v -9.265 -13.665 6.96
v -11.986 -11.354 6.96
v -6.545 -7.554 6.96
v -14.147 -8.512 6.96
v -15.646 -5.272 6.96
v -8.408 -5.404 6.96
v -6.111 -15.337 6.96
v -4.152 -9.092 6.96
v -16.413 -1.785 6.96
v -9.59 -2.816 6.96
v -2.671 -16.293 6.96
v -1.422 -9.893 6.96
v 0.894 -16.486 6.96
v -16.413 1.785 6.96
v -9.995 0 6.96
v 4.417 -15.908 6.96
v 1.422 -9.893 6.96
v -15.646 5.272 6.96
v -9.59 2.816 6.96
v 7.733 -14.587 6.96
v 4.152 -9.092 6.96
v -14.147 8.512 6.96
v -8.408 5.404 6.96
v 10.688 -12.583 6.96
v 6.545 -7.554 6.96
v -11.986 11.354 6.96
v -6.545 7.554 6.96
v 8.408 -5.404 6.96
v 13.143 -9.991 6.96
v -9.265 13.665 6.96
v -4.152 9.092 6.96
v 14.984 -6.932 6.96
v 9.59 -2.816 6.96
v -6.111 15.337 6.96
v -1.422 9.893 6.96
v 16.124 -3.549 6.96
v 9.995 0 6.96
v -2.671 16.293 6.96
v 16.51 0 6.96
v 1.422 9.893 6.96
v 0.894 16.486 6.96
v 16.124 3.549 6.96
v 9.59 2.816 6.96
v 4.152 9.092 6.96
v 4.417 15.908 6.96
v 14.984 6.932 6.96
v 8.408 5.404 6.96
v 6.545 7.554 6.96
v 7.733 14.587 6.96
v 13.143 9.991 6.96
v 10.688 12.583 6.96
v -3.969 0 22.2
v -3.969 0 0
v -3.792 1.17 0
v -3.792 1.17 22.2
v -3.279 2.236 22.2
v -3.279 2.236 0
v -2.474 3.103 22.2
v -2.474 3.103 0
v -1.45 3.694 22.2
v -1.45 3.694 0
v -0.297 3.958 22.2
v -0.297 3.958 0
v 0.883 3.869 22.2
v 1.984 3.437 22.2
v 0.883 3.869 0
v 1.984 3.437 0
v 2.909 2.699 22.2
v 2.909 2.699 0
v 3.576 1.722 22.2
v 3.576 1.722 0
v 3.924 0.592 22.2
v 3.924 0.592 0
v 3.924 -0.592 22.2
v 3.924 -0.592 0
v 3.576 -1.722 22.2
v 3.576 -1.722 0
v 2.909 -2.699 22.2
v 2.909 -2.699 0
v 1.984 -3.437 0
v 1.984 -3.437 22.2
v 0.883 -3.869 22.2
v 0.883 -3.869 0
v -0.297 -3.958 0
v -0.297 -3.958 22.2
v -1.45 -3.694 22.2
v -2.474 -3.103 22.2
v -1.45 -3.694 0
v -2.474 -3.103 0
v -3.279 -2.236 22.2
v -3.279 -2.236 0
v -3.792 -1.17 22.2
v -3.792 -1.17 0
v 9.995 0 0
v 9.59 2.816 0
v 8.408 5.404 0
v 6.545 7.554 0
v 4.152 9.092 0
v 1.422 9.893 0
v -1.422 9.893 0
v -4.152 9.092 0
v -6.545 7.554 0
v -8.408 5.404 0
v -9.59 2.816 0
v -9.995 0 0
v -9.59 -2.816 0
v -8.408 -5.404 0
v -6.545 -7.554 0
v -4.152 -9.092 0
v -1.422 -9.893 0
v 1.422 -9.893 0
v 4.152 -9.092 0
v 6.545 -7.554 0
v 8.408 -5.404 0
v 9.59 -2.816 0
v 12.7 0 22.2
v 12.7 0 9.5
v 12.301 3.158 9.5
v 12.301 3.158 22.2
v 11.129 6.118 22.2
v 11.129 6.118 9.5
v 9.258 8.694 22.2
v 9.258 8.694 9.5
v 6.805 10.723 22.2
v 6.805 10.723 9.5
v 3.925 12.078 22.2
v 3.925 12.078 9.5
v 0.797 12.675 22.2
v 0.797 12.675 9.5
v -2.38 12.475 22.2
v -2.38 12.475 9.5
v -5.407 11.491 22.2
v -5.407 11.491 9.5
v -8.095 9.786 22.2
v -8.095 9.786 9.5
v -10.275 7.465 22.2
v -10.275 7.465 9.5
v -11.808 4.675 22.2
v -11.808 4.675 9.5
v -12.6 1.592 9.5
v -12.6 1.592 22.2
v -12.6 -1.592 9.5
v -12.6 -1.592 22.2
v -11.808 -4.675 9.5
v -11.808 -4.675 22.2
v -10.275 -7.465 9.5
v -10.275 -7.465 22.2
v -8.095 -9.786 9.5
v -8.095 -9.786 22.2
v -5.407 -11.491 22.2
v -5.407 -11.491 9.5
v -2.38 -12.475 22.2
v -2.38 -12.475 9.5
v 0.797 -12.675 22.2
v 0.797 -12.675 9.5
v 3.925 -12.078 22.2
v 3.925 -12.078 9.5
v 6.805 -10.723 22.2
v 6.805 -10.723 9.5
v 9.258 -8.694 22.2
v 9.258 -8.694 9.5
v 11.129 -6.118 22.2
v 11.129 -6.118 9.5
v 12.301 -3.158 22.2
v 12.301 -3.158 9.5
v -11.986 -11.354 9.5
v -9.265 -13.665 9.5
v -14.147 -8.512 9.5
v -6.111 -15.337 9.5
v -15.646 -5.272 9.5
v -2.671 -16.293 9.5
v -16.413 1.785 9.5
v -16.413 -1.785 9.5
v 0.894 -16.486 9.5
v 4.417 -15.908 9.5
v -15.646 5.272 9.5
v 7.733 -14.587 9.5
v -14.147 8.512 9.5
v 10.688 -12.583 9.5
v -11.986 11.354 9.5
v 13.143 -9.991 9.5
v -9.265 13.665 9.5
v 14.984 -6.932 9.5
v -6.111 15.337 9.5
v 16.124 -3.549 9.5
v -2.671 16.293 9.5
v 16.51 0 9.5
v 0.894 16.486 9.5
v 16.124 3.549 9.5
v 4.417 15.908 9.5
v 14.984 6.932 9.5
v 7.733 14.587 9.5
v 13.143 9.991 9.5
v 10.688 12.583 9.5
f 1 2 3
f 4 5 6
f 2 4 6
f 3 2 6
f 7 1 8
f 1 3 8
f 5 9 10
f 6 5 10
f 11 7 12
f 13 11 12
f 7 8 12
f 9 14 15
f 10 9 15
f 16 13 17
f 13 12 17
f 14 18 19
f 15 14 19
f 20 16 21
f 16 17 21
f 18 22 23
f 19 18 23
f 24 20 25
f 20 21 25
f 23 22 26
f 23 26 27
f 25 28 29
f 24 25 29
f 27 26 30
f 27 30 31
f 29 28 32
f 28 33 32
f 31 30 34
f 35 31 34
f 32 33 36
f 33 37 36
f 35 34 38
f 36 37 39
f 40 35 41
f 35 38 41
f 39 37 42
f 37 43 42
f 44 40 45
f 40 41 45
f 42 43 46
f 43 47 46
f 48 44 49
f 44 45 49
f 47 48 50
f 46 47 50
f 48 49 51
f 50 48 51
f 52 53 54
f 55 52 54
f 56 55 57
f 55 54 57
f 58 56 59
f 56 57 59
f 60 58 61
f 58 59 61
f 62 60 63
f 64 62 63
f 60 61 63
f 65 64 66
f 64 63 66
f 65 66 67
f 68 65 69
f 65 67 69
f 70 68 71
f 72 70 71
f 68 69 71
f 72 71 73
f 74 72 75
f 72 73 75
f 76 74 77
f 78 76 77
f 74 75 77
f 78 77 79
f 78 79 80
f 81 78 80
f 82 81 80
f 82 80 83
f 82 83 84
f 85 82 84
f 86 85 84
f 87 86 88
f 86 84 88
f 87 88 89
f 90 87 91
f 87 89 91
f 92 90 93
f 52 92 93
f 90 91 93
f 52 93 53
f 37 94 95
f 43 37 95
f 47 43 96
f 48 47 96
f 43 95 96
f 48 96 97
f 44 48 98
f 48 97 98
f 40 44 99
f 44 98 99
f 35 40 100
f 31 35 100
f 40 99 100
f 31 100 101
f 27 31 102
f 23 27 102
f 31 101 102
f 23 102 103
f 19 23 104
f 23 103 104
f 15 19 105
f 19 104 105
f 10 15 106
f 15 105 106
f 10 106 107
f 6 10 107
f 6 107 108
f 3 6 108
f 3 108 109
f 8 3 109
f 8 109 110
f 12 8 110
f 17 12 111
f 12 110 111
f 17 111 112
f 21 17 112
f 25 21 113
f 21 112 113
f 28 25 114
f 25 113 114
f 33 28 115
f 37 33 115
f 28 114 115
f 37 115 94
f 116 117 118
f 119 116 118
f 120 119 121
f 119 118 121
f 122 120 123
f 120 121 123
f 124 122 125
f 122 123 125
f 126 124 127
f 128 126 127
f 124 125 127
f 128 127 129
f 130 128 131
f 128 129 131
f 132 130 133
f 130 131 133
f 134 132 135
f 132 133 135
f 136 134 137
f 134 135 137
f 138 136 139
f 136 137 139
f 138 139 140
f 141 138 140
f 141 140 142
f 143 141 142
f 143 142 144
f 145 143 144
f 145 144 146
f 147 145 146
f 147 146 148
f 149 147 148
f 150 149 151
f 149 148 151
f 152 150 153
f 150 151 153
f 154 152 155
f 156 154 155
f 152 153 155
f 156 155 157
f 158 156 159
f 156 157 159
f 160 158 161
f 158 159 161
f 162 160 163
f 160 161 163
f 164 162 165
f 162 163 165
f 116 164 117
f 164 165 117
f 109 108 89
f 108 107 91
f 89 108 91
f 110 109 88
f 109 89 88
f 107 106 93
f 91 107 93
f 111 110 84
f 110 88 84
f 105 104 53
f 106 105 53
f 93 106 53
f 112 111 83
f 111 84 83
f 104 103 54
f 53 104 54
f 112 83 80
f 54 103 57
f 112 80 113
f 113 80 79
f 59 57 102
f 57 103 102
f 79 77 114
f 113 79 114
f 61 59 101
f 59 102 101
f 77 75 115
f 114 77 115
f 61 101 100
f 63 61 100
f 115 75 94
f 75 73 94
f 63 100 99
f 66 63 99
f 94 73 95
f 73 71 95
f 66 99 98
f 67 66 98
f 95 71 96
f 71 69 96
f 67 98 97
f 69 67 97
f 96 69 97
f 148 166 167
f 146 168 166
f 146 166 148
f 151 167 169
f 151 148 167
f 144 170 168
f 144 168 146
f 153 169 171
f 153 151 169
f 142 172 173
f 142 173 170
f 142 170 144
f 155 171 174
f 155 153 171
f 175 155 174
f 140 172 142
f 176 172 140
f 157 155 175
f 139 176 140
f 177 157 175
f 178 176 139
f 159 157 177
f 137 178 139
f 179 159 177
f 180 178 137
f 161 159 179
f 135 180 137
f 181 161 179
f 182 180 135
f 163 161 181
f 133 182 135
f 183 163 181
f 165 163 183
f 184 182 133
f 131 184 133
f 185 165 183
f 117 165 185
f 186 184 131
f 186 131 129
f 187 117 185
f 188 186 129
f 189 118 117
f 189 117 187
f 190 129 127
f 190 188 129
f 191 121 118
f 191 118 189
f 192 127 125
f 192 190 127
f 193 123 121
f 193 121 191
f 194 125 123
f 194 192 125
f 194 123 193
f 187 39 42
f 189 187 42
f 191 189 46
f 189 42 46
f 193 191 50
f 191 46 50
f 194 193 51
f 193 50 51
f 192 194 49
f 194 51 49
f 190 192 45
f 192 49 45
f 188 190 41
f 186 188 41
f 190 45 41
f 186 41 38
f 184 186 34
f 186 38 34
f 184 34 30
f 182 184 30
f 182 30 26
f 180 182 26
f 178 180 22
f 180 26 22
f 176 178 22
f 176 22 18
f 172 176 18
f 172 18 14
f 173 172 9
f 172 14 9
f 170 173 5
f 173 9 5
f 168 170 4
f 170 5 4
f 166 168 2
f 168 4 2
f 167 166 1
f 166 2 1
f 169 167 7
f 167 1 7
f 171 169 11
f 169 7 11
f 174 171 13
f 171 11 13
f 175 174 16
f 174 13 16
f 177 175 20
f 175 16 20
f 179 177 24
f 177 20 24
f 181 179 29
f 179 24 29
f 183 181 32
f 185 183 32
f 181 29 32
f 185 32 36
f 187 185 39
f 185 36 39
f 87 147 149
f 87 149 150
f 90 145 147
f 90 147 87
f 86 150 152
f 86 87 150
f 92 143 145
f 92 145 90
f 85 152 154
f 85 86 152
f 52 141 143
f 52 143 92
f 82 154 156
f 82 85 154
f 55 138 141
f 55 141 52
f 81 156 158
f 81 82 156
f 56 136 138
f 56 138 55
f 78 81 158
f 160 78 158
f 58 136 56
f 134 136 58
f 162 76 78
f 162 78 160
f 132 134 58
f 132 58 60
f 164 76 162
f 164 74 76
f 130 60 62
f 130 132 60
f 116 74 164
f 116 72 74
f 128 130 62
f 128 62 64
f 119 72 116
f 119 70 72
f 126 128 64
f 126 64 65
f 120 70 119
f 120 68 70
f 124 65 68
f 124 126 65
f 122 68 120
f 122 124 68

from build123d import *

# Parameters (mm, degrees)
SKETCH1_R           = 9.9949
BOSS_EXTRUDE1_DEPTH = 6.9596
SKETCH2_R           = 16.51
BOSS_EXTRUDE2_DEPTH = 2.54
SKETCH5_R           = 12.7
BOSS_EXTRUDE4_DEPTH = 12.7
SKETCH6_R           = 3.96875
CUT_EXTRUDE1_DEPTH  = 22.1996


with BuildPart() as part:
    # Sketch1 → Boss-Extrude1 (new body)
    with BuildSketch(Plane.XY):
        Circle(SKETCH1_R)
    extrude(amount=BOSS_EXTRUDE1_DEPTH)

    # Sketch2 → Boss-Extrude2 (add)
    with BuildSketch(Plane.XY.offset(6.9596)):
        Circle(SKETCH2_R)
    extrude(amount=BOSS_EXTRUDE2_DEPTH)

    # Sketch5 → Boss-Extrude4 (add)
    with BuildSketch(Plane.XY.offset(9.4996)):
        Circle(SKETCH5_R)
    extrude(amount=BOSS_EXTRUDE4_DEPTH)

    # Sketch6 → Cut-Extrude1 (cut)
    with BuildSketch(Plane(origin=(0, 0, 0), x_dir=(-1, 0, 0), z_dir=(0, 0, -1))):
        Circle(SKETCH6_R)
    extrude(amount=-CUT_EXTRUDE1_DEPTH, mode=Mode.SUBTRACT)


solid = part.part
